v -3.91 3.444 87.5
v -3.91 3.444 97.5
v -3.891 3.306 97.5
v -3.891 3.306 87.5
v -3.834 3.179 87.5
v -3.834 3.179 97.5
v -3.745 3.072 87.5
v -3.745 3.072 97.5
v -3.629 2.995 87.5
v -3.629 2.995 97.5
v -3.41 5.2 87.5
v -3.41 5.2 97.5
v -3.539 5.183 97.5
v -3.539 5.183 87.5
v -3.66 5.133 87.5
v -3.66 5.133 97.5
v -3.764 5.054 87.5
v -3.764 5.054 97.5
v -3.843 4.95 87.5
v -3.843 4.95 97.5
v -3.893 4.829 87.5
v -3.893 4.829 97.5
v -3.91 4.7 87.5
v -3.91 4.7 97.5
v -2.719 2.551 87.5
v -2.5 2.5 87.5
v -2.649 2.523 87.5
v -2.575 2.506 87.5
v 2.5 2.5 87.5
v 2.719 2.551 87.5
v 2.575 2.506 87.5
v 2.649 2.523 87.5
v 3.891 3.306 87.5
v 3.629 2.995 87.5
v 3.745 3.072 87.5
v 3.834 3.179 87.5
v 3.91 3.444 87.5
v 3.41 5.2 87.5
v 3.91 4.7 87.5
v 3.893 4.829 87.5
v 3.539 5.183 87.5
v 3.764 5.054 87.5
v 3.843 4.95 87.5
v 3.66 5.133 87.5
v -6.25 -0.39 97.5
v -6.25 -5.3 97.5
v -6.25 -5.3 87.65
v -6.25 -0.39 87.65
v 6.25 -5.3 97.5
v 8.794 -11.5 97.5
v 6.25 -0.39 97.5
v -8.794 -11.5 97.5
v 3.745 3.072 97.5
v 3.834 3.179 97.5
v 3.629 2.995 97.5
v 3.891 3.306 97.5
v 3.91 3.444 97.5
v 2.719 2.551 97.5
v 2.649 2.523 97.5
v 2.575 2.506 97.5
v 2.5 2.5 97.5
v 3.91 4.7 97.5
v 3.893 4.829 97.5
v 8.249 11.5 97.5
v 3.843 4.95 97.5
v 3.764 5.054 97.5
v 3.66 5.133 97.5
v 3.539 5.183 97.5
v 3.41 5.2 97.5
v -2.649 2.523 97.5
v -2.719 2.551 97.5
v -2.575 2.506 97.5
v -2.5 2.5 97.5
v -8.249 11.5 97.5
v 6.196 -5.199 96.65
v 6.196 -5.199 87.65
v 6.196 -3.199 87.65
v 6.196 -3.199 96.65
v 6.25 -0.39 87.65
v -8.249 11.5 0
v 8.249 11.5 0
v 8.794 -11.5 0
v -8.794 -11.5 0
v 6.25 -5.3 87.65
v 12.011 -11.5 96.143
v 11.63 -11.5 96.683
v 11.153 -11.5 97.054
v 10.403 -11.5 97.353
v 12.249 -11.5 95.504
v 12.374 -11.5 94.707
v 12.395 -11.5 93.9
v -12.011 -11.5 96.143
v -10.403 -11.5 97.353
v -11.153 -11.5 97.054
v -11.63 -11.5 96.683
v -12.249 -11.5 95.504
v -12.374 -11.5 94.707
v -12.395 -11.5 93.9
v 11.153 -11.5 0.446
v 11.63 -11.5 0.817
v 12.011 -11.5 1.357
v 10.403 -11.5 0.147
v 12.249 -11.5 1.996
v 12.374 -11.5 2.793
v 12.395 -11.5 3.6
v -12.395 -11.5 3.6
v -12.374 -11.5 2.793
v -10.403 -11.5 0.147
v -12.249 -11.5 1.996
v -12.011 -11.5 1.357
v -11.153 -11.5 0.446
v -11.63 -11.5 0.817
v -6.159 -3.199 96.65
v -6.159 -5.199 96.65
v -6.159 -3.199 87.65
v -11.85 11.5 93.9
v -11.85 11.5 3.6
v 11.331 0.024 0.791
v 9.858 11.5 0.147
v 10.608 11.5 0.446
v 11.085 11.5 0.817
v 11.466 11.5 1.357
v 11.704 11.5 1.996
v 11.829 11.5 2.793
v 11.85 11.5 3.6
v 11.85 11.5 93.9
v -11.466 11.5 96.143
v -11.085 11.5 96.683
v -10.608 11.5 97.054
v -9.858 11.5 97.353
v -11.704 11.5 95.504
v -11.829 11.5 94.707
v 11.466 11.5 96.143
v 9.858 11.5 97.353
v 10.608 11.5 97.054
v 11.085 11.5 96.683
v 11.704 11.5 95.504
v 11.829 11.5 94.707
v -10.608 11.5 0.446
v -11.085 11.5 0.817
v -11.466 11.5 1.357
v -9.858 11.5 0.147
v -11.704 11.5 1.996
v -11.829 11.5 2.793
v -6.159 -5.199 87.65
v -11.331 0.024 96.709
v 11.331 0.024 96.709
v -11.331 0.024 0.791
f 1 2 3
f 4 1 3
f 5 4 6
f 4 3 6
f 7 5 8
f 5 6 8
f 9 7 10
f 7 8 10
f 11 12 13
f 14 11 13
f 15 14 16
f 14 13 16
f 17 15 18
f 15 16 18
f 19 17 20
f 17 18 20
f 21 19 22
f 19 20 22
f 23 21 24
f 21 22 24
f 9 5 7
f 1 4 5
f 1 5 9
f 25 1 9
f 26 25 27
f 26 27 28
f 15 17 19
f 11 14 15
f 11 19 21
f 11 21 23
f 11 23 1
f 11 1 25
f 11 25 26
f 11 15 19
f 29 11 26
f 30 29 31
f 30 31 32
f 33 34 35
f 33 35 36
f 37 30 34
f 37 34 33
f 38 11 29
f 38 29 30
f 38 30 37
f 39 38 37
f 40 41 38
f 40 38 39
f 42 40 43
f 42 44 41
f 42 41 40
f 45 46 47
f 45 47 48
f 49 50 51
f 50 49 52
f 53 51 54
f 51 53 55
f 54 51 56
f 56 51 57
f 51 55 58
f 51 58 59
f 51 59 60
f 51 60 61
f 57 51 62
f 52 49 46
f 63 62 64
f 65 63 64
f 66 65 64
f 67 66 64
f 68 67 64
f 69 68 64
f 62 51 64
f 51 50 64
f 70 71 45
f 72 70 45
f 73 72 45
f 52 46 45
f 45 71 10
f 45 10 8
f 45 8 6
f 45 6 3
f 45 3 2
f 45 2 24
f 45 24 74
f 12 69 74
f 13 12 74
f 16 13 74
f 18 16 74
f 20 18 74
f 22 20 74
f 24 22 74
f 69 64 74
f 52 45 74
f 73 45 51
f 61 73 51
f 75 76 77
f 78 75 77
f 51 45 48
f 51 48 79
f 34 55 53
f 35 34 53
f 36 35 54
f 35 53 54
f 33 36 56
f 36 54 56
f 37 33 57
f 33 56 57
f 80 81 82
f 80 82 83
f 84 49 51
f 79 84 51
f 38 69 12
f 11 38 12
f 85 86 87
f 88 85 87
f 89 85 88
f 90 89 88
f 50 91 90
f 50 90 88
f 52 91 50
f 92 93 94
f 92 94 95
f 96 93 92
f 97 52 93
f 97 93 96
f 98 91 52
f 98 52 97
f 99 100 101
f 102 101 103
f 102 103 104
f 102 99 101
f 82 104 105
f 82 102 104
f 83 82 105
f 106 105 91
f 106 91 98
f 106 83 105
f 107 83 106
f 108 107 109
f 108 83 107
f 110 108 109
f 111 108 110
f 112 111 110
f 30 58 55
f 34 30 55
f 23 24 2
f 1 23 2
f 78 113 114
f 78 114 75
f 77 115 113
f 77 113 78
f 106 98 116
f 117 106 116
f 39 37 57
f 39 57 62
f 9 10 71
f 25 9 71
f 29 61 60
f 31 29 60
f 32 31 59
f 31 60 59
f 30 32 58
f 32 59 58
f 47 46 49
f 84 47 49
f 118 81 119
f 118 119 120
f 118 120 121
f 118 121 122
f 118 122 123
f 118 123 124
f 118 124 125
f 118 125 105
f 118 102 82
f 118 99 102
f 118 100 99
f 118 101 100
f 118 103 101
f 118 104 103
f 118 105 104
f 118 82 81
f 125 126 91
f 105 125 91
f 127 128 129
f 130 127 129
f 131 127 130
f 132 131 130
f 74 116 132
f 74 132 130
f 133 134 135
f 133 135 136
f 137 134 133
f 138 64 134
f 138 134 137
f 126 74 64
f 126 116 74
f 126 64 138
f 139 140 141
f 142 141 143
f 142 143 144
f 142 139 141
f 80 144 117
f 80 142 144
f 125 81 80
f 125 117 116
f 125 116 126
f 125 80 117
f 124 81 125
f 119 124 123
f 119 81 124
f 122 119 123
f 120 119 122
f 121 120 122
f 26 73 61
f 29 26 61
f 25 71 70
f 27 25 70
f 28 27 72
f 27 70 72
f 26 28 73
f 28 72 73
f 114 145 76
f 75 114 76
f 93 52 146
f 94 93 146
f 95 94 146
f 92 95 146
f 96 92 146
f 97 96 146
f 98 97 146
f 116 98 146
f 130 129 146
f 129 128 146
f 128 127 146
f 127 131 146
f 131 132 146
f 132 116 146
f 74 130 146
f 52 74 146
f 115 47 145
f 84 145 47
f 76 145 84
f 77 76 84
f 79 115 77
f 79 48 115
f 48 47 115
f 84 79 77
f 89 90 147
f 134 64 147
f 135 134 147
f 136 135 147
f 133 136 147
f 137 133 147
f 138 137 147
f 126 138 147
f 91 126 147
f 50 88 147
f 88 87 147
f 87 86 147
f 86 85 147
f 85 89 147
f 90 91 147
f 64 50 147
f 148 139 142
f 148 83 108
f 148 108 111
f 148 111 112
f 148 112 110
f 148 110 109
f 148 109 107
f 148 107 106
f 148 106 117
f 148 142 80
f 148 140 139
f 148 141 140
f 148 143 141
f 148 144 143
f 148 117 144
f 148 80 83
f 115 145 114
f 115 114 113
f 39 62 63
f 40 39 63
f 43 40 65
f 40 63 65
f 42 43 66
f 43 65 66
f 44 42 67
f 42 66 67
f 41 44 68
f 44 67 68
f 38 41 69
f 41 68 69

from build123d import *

# Parameters (mm, degrees)
BOSS_EXTRUDE2_DEPTH = 97.5
FILLET4_SIZE        = 3.6
SKETCH2_W           = 12.5
SKETCH2_H           = 4.91
CUT_EXTRUDE1_DEPTH  = 9.85
CUT_EXTRUDE2_DEPTH  = 10
SKETCH4_W           = 12.355512527
SKETCH4_H           = 2
BOSS_EXTRUDE3_DEPTH = 9


with BuildPart() as part:
    # Sketch1 → Boss-Extrude2 (new body)
    with BuildSketch(Plane.XY):
        Polygon((12.395, -11.5), (-12.395, -11.5), (-11.85, 11.5), (11.85, 11.5), align=None)
    extrude(amount=BOSS_EXTRUDE2_DEPTH)

    # Fillet4
    # a fillet whose section is not a circle: 3.6 mm, written as the material it takes off along each edge
    with BuildSketch(Plane(origin=(-12.608201023, -20.497474386, 0), x_dir=(0, 0, 1), z_dir=(0.023689002610023418, 0.9997193762028135, 0)), Plane(origin=(11.636798977, 20.497474386, 0), x_dir=(0, 0, 1), z_dir=(0.023689002610022953, -0.9997193762028134, 0))) as fillet4_piece_1:
        with BuildLine():
            add(Edge.make_bspline([(FILLET4_SIZE, 0), (FILLET4_SIZE * 0.831801948466, 0), (FILLET4_SIZE * 0.663603896932, 0), (FILLET4_SIZE * 0.292893218813, FILLET4_SIZE * 0.0716919198361), (FILLET4_SIZE * 0.0716919198361, FILLET4_SIZE * 0.292893218813), (0, FILLET4_SIZE * 0.663603896932), (0, FILLET4_SIZE * 0.831801948466), (0, FILLET4_SIZE)], knots=[0, 0, 0, 0, 0, 0, 0.5, 0.5, 1, 1, 1, 1, 1, 1], degree=5))
            Line((0, FILLET4_SIZE), (0, 0))
            Line((0, 0), (FILLET4_SIZE, 0))
        make_face()
    extrude(amount=41.006456159, mode=Mode.SUBTRACT)
    with BuildSketch(Plane(origin=(-12.608201023, -20.497474386, 97.5), x_dir=(0, 0, -1), z_dir=(0.023689002610023418, 0.9997193762028135, 0)), Plane(origin=(11.636798977, 20.497474386, 97.5), x_dir=(0, 0, -1), z_dir=(0.023689002610022953, -0.9997193762028134, 0))) as fillet4_piece_2:
        with BuildLine():
            add(Edge.make_bspline([(FILLET4_SIZE, 0), (FILLET4_SIZE * 0.831801948466, 0), (FILLET4_SIZE * 0.663603896932, 0), (FILLET4_SIZE * 0.292893218813, -FILLET4_SIZE * 0.0716919198361), (FILLET4_SIZE * 0.0716919198361, -FILLET4_SIZE * 0.292893218813), (0, -FILLET4_SIZE * 0.663603896932), (0, -FILLET4_SIZE * 0.831801948466), (0, -FILLET4_SIZE)], knots=[0, 0, 0, 0, 0, 0, 0.5, 0.5, 1, 1, 1, 1, 1, 1], degree=5))
            Line((0, -FILLET4_SIZE), (0, 0))
            Line((0, 0), (FILLET4_SIZE, 0))
        make_face()
    extrude(amount=41.006456159, mode=Mode.SUBTRACT)

    # Sketch2 → Cut-Extrude1 (cut)
    with BuildSketch(Plane.XY.offset(97.5)):
        with Locations((0, -2.845)):
            Rectangle(SKETCH2_W, SKETCH2_H)
    extrude(amount=-CUT_EXTRUDE1_DEPTH, mode=Mode.SUBTRACT)

    # Sketch3 → Cut-Extrude2 (cut)
    with BuildSketch(Plane.XY.offset(97.5)):
        with BuildLine():
            Line((-3.629235437, 2.994588956), (-2.719235437, 2.5506273))
            ThreePointArc((-2.719235437, 2.5506273), (-2.612502556, 2.512821208), (-2.5, 2.5))
            Line((-2.5, 2.5), (2.5, 2.5))
            ThreePointArc((2.5, 2.5), (2.612502556, 2.512821208), (2.719235437, 2.5506273))
            Line((2.719235437, 2.5506273), (3.629235437, 2.994588956))
            ThreePointArc((3.629235437, 2.994588956), (3.834038747, 3.179025548), (3.91, 3.443961655))
            Line((3.91, 3.443961655), (3.91, 4.7))
            ThreePointArc((3.91, 4.7), (3.763553391, 5.053553391), (3.41, 5.2))
            Line((3.41, 5.2), (-3.41, 5.2))
            ThreePointArc((-3.41, 5.2), (-3.763553391, 5.053553391), (-3.91, 4.7))
            Line((-3.91, 4.7), (-3.91, 3.443961655))
            ThreePointArc((-3.91, 3.443961655), (-3.834038747, 3.179025548), (-3.629235437, 2.994588956))
        make_face()
    extrude(amount=-CUT_EXTRUDE2_DEPTH, mode=Mode.SUBTRACT)

    # Sketch4 → Boss-Extrude3 (add)
    with BuildSketch(Plane.XY.offset(87.65)):
        with Locations((0.018279413, -4.198858777)):
            Rectangle(SKETCH4_W, SKETCH4_H)
    extrude(amount=BOSS_EXTRUDE3_DEPTH)


solid = part.part
